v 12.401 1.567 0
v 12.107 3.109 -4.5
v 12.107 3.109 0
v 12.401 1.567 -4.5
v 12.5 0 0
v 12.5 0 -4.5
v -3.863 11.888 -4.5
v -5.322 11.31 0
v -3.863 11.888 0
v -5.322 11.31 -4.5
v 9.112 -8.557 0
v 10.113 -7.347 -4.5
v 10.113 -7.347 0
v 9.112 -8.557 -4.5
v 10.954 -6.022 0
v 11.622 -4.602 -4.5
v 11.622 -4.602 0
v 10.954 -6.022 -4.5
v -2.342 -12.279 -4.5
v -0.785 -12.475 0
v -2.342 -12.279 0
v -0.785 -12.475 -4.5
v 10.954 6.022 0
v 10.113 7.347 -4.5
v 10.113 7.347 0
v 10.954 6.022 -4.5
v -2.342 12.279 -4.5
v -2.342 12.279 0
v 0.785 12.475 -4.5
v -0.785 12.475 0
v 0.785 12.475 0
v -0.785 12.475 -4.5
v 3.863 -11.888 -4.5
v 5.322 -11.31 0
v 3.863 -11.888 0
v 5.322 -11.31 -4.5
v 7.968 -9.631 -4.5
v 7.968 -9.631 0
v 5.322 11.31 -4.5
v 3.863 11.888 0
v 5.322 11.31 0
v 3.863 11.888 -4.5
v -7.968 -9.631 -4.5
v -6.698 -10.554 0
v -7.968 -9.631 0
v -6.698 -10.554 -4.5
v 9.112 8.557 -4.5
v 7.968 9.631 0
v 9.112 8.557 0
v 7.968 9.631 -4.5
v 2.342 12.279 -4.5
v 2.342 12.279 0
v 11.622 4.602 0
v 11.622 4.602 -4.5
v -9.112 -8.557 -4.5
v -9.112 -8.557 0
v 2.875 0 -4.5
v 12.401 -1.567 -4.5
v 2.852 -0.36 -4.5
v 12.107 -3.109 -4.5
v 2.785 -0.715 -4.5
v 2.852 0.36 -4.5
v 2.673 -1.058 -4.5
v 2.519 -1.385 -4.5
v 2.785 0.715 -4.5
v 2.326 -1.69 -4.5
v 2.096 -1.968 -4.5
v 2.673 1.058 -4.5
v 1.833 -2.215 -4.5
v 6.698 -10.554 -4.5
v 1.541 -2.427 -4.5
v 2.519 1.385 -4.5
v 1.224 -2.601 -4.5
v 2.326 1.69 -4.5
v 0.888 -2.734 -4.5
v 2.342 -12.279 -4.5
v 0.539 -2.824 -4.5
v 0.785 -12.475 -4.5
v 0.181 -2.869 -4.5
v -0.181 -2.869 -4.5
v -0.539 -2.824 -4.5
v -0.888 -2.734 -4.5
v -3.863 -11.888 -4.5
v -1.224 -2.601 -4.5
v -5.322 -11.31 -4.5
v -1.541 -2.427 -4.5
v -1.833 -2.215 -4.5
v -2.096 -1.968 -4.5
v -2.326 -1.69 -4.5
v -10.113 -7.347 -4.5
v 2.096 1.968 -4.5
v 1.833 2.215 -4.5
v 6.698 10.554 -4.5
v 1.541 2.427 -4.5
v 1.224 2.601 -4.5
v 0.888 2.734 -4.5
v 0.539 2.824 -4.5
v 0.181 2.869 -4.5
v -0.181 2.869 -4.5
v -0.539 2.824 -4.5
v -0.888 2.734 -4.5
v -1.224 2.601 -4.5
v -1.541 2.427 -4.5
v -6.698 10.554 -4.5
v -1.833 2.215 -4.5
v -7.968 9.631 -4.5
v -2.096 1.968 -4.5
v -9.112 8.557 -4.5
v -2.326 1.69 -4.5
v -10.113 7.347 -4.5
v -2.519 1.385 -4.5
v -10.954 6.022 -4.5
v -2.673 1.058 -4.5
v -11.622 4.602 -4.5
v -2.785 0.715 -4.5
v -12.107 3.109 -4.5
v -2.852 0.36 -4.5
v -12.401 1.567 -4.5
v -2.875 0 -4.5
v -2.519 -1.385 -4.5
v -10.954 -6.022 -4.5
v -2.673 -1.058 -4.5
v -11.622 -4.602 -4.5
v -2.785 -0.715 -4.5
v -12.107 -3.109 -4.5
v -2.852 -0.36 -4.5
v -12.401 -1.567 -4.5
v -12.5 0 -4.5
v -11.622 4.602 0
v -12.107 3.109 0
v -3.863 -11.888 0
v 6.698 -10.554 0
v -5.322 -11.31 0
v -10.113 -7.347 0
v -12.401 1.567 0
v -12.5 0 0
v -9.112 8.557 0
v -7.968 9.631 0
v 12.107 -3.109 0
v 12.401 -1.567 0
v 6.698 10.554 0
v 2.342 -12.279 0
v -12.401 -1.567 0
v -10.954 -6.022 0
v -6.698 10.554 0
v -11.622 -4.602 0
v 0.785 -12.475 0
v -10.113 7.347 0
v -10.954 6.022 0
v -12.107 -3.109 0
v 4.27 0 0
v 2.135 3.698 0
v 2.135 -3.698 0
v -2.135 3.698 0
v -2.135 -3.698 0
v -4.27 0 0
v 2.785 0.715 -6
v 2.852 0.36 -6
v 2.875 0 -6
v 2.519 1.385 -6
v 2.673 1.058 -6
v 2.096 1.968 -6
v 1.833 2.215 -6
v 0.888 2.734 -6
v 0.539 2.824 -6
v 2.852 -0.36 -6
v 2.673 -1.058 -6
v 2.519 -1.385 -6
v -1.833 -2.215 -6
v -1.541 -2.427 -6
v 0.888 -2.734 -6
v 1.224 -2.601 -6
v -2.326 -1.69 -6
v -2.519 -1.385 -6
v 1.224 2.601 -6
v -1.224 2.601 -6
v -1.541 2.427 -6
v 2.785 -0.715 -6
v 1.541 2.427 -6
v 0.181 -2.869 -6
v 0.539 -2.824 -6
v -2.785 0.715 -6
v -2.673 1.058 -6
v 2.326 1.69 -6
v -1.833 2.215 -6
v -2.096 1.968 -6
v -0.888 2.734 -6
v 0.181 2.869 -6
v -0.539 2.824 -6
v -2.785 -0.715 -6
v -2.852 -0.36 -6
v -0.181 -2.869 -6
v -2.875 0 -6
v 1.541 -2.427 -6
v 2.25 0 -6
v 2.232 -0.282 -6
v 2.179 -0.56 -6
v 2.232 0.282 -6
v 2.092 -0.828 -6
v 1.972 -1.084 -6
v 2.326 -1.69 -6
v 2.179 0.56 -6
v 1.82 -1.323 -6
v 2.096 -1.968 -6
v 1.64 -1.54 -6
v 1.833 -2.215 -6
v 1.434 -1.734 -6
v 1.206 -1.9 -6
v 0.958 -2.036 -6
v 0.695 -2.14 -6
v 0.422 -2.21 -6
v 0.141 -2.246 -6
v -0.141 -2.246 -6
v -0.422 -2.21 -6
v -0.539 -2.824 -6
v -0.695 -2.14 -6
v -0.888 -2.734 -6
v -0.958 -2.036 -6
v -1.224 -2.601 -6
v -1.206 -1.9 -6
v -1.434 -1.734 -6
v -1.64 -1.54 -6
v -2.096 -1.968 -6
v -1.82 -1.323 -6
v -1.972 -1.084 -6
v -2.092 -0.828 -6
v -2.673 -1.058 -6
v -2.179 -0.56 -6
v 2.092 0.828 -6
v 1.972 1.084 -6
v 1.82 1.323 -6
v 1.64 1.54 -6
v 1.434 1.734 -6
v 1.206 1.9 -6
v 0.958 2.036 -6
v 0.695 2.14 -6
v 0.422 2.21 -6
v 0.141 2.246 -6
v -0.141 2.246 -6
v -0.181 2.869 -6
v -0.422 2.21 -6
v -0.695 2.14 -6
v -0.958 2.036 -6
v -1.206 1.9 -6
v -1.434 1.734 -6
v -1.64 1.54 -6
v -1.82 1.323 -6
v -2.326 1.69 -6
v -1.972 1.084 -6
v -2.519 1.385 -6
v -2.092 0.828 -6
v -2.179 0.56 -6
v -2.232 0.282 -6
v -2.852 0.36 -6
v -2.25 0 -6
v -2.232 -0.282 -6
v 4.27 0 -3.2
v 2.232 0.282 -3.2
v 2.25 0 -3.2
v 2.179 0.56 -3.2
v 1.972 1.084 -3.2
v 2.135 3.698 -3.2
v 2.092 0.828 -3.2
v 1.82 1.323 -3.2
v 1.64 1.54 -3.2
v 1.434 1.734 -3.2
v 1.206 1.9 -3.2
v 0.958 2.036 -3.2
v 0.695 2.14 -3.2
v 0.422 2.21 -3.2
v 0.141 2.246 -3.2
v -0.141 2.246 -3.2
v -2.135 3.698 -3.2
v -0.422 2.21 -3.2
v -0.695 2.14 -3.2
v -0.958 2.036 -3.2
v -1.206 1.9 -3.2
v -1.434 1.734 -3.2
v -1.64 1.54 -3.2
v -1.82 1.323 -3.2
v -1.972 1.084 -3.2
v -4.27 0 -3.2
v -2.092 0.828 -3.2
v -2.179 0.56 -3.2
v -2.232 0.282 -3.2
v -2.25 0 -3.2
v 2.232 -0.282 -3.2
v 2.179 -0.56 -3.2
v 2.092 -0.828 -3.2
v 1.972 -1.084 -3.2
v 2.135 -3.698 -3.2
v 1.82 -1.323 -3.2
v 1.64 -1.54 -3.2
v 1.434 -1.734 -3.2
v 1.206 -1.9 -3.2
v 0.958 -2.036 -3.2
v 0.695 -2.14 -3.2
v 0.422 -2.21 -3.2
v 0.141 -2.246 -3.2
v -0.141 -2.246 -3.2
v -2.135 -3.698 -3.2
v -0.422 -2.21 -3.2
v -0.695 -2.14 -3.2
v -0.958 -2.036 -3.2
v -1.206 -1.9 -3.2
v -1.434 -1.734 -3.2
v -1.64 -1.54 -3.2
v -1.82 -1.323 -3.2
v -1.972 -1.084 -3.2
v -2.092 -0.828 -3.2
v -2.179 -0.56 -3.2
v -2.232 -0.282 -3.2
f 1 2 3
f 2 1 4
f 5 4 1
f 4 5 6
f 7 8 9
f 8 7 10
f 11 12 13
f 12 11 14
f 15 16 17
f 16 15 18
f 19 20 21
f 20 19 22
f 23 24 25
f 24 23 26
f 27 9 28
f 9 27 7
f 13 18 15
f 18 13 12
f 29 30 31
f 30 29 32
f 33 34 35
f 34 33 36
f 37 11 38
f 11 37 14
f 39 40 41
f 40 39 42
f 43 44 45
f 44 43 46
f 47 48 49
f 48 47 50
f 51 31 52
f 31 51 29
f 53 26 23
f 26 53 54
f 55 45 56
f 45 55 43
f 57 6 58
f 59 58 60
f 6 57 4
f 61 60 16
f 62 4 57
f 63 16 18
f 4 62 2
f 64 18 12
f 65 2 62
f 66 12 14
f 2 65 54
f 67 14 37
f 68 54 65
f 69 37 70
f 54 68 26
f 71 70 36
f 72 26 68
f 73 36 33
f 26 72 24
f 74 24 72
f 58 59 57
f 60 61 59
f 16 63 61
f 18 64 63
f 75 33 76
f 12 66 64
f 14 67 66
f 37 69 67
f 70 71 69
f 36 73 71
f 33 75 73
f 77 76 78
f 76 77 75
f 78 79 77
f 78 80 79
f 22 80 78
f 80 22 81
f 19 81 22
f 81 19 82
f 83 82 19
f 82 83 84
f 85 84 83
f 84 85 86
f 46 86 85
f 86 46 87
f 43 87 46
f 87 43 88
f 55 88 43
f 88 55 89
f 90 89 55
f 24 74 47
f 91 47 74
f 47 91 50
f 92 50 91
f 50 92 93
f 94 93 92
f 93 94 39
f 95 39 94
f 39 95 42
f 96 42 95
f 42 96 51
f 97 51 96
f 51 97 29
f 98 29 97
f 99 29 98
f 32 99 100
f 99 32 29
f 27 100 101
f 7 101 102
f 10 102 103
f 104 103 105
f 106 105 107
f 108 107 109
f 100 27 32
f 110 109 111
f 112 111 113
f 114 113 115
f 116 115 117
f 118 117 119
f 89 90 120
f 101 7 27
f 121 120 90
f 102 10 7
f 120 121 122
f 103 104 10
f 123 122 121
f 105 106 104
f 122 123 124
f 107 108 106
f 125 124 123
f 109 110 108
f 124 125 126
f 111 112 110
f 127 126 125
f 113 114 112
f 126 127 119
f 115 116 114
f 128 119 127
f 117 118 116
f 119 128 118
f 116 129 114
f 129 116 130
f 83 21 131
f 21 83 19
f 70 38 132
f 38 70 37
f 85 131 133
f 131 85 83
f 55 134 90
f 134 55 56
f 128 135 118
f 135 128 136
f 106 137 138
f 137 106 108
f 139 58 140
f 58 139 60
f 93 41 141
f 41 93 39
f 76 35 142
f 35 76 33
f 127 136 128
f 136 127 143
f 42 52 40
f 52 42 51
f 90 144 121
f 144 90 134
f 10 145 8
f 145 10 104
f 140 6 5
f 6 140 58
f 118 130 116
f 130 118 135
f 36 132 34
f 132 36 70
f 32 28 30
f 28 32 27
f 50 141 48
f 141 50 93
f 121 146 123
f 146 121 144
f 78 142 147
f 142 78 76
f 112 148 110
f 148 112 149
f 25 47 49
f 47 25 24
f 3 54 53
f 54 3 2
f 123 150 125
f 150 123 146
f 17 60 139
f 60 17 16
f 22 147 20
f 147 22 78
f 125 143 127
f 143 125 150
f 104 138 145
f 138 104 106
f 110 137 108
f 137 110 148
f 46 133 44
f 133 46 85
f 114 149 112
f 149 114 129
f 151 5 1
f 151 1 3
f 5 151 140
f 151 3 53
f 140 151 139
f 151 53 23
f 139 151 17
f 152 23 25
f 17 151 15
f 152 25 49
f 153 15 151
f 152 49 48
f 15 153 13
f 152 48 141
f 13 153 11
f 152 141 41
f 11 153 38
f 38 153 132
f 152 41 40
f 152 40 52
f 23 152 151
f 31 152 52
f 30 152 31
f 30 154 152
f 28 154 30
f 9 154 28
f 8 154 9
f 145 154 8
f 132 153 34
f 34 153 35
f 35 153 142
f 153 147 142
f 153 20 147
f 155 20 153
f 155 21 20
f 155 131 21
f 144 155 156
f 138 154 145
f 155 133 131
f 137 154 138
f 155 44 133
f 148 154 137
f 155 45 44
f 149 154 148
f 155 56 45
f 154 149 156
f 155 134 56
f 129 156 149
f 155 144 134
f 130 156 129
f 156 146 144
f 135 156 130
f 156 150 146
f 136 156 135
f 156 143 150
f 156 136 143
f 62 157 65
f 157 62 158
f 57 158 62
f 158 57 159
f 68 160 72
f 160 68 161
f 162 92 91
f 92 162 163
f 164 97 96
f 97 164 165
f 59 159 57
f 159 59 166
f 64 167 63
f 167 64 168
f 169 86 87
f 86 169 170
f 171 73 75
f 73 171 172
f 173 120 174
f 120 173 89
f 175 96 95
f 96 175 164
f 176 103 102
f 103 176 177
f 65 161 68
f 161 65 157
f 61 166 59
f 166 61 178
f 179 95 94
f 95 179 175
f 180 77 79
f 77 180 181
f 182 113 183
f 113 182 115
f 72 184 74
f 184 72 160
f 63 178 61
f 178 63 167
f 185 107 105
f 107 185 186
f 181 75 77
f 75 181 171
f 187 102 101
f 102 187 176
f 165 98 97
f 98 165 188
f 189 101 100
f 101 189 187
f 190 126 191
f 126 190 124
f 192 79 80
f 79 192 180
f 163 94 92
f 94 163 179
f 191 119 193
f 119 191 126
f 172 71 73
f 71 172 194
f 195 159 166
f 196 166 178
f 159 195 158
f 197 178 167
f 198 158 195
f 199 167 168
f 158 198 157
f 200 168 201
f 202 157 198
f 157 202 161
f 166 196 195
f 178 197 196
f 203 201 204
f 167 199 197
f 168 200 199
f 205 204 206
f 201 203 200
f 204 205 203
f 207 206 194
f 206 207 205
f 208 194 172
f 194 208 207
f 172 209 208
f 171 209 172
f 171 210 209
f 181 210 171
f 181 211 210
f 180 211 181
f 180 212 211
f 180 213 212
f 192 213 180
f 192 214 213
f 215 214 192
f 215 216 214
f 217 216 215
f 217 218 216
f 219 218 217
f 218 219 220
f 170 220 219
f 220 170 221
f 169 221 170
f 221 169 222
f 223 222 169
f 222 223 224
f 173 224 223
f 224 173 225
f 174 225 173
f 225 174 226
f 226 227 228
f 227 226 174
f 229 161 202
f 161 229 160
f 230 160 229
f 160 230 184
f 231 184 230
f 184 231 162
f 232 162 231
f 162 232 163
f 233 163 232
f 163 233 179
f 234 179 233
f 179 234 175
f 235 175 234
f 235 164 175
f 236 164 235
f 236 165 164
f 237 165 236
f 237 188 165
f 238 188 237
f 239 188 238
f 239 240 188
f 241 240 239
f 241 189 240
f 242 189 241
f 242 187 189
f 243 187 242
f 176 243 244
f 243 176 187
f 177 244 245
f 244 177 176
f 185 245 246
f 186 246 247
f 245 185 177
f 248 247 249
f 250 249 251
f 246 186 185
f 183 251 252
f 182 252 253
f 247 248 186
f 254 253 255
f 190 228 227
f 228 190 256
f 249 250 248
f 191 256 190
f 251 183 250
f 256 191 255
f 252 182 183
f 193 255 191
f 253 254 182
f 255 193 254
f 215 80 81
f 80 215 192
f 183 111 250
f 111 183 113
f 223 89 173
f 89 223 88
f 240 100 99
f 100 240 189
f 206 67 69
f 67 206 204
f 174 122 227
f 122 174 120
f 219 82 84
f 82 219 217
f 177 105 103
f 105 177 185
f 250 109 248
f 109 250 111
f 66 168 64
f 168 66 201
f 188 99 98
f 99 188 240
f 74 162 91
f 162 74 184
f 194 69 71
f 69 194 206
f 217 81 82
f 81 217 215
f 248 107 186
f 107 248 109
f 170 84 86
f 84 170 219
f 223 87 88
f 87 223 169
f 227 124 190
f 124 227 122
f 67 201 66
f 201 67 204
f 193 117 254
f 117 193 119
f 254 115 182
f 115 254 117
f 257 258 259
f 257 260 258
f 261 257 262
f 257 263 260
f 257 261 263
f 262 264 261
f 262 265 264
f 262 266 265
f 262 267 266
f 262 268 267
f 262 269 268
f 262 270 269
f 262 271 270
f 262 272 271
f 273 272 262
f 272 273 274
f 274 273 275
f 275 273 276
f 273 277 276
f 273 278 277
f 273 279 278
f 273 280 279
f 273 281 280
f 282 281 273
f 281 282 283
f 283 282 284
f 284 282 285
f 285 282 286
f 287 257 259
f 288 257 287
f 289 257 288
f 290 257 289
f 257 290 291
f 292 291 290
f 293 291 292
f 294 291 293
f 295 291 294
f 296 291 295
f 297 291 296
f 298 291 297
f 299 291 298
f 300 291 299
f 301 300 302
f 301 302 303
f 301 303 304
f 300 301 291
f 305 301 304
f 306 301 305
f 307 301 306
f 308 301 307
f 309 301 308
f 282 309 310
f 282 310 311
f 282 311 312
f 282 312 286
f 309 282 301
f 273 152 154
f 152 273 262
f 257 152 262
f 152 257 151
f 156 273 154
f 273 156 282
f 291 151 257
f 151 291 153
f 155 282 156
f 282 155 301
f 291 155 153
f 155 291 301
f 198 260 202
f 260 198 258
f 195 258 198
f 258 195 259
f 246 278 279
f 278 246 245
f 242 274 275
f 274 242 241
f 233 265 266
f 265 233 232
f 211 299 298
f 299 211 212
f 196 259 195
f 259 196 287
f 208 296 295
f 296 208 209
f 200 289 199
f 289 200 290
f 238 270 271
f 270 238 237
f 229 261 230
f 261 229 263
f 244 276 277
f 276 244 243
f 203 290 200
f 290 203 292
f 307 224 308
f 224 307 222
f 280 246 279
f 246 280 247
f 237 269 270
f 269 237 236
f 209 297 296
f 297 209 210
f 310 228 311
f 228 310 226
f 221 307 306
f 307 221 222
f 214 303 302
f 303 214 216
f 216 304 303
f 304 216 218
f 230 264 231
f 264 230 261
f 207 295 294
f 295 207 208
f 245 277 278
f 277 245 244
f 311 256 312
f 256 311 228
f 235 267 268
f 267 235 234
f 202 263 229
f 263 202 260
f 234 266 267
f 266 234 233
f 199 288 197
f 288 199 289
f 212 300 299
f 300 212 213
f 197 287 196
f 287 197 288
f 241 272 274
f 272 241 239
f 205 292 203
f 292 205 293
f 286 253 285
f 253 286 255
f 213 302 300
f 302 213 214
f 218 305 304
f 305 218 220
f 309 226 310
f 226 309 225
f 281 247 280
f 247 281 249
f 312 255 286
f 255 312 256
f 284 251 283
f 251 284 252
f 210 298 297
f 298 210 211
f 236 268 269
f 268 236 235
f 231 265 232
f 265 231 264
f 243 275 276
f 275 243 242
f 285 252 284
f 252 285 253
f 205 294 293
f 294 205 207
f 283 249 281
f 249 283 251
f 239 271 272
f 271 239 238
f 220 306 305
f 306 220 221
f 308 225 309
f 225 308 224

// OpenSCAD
$fn = 50;


difference() {
	union() {
		translate(v = [0, 0, -4.5000000000]) {
			cylinder(h = 4.5000000000, r = 12.5000000000);
		}
		#translate(v = [0, 0, -6.0000000000]) {
			cylinder(h = 6, r = 2.8750000000);
		}
	}
	union() {
		translate(v = [0, 0, 0]) {
			rotate(a = [0, 0, 0]) {
				difference() {
					union() {
						translate(v = [0, 0, -3.2000000000]) {
							linear_extrude(height = 3.2000000000) {
								polygon(points = [[4.2698000000, 0.0000000000], [2.1349000000, 3.6977552691], [-2.1349000000, 3.6977552691], [-4.2698000000, 0.0000000000], [-2.1349000000, -3.6977552691], [2.1349000000, -3.6977552691]]);
							}
						}
					}
					union();
				}
			}
		}
		#translate(v = [0, 0, -100.0000000000]) {
			cylinder(h = 200, r = 2.2500000000);
		}
	}
}
